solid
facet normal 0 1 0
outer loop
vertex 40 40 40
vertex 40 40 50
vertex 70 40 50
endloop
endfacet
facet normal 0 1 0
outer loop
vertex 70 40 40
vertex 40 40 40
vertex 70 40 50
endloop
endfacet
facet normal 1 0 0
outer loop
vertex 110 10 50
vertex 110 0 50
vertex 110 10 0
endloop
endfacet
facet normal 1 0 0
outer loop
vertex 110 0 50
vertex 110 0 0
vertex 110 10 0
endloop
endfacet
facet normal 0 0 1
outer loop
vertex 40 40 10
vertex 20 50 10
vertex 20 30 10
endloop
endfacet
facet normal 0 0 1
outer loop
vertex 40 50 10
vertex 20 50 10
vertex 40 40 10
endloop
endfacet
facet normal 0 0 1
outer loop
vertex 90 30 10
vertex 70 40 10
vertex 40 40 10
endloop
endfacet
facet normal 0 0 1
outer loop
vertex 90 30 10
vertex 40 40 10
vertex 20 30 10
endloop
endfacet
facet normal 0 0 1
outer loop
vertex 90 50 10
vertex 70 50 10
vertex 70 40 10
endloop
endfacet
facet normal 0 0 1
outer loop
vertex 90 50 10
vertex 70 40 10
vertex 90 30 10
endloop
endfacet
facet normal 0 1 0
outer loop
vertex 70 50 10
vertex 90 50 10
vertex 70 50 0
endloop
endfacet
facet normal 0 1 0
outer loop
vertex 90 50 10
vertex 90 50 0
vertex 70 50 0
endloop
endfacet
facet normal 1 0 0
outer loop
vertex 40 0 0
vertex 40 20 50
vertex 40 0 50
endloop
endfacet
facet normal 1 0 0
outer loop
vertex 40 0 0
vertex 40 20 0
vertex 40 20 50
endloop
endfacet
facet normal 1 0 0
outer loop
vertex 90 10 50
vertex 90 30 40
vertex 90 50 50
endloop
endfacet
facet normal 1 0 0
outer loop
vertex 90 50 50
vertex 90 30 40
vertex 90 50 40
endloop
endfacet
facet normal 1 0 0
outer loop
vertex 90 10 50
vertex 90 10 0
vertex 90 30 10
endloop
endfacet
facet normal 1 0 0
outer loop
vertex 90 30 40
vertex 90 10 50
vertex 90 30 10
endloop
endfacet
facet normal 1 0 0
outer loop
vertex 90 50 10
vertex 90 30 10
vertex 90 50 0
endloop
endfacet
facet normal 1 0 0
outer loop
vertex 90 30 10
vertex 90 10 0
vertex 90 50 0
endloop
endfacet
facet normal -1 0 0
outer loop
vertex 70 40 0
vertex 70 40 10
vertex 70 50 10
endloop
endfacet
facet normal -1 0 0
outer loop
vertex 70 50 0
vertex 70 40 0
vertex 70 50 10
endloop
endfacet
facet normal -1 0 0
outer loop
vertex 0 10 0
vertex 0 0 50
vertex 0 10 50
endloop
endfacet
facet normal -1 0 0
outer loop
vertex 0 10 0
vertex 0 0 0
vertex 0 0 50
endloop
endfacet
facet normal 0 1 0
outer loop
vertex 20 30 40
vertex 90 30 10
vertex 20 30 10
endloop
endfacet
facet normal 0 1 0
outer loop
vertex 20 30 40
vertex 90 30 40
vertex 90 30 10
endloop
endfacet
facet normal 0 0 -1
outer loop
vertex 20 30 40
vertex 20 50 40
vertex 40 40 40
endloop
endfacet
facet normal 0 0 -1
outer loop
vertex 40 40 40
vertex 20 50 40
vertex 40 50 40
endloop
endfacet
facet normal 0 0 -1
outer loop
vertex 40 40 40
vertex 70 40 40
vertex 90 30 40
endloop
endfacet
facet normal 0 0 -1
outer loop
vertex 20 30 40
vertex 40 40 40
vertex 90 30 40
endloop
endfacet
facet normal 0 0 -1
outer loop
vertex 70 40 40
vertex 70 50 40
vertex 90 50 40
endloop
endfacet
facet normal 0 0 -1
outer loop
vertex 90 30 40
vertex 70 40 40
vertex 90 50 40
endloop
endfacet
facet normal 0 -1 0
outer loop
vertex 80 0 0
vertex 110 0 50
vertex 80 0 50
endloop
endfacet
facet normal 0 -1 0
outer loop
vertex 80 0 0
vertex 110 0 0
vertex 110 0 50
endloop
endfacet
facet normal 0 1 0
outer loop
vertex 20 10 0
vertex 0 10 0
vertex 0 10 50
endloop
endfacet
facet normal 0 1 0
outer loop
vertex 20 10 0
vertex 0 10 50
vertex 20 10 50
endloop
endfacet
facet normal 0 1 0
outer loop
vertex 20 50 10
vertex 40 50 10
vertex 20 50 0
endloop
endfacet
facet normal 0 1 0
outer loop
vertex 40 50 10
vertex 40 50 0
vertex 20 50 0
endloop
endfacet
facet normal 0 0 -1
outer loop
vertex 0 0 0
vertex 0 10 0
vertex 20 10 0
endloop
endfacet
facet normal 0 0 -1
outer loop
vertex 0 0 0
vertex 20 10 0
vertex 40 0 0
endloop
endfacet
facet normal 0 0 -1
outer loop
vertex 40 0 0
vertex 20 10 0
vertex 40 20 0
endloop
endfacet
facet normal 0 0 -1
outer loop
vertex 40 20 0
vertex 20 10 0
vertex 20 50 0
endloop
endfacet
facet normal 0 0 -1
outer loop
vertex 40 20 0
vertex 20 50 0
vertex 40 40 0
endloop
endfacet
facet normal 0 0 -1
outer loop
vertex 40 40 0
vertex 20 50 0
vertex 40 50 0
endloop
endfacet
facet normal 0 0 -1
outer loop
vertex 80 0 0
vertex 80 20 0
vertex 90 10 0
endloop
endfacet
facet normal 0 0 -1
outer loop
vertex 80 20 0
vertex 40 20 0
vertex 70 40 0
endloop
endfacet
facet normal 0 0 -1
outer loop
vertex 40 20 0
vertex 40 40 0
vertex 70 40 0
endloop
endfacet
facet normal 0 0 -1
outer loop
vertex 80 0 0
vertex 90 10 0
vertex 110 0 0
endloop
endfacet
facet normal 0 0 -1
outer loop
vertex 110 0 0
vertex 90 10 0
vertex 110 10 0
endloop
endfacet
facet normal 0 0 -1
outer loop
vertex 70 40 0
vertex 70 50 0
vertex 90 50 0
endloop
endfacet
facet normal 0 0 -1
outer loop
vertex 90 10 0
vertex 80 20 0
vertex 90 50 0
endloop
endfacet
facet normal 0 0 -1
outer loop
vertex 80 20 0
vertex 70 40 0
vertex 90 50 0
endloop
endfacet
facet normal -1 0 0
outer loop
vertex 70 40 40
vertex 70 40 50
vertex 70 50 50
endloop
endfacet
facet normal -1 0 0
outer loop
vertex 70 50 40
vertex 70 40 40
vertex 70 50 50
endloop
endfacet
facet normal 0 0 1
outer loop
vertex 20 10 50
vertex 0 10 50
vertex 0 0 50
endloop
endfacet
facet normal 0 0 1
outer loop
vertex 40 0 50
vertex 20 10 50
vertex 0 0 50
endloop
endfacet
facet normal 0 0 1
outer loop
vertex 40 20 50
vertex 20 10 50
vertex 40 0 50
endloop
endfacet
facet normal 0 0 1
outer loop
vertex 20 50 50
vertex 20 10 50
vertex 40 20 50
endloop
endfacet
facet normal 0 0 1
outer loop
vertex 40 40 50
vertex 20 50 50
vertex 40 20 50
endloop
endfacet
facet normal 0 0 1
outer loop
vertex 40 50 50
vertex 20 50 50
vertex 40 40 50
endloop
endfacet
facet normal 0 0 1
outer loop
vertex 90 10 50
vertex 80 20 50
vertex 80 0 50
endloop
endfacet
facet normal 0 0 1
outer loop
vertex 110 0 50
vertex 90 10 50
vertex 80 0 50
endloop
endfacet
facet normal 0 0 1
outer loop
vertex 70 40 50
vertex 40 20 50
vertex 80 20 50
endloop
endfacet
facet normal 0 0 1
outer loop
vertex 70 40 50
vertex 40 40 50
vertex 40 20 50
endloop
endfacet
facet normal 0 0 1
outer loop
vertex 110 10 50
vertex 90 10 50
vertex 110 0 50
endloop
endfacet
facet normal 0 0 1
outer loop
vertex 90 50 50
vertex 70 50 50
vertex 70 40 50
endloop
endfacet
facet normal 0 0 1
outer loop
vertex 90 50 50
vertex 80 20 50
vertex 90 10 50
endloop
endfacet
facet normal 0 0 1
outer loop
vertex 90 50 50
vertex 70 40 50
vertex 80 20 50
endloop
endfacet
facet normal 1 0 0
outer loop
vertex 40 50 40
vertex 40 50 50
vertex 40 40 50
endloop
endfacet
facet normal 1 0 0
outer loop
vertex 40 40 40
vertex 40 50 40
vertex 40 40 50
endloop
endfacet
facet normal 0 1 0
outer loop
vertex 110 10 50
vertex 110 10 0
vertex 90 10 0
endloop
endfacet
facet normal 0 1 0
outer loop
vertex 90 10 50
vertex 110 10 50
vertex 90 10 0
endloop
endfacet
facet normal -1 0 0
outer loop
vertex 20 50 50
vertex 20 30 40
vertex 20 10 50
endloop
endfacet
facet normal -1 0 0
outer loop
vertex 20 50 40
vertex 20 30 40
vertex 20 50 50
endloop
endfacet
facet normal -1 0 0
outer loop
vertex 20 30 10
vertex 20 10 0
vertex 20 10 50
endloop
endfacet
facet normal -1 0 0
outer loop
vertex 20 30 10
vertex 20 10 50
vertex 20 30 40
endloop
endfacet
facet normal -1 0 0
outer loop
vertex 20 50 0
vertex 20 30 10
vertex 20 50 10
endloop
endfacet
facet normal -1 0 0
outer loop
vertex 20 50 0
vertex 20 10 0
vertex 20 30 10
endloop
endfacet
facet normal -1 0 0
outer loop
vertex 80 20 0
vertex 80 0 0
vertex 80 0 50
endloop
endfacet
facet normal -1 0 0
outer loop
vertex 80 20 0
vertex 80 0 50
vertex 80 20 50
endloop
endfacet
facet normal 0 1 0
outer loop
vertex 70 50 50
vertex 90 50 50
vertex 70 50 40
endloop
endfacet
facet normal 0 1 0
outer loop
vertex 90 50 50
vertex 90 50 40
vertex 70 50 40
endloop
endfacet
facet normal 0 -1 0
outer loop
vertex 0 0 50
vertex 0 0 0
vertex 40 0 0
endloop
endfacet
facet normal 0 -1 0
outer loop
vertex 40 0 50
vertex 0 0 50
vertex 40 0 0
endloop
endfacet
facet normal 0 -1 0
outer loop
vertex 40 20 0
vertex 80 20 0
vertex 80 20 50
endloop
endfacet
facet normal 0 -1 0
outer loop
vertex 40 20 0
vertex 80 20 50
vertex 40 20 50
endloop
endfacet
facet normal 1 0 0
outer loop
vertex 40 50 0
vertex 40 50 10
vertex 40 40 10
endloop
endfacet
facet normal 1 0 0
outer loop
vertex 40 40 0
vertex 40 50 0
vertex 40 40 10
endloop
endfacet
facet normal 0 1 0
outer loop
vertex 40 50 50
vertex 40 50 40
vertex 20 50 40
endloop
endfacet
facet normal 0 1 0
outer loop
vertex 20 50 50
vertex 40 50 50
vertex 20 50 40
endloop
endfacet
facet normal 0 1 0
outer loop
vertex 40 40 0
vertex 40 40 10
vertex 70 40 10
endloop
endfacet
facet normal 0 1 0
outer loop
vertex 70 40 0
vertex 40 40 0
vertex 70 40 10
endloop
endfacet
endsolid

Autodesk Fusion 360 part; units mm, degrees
sketch "Sketch1" plane through (0, 0, 0) normal (0, 0, 1) x (1, 0, 0)
  line L0 (110, 0) -> (80, 0)
  line L1 (80, 0) -> (80, 20)
  line L2 (80, 20) -> (40, 20)
  line L3 (40, 20) -> (40, 0)
  line L4 (0, 0) -> (40, 0)
  line L5 (80, 0) -> (110, 0)
  line L6 (110, 0) -> (110, 10)
  line L7 (110, 10) -> (90, 10)
  line L8 (90, 10) -> (90, 50)
  line L9 (90, 50) -> (20, 50)
  line L10 (0, 0) -> (0, 10)
  line L11 (0, 10) -> (20, 10)
  line L12 (20, 10) -> (20, 50)
  dimension "d1" = 110
  dimension "d2" = 30
  dimension "d3" = 20
  dimension "d4" = 40
  dimension "d5" = 10
  dimension "d6" = 20
  dimension "d7" = 70
  dimension "d8" = 10
  dimension "d9" = 20
extrude "Extrude1" add sketch "Sketch1" along normal blind 50
sketch "Sketch2" plane through (0, 0, 50) normal (0, 0, 1) x (1, 0, 0)
  line L0 (0, 0) -> (40, 0)
  line L1 (40, 0) -> (40, 20)
  line L2 (40, 20) -> (80, 20)
  line L3 (80, 20) -> (80, 0)
  line L4 (80, 0) -> (110, 0)
  line L5 (110, 0) -> (110, 10)
  line L6 (110, 10) -> (90, 10)
  line L7 (90, 10) -> (90, 50)
  line L8 (90, 50) -> (20, 50)
  line L9 (20, 50) -> (20, 10)
  line L10 (20, 10) -> (0, 10)
  line L11 (0, 10) -> (0, 0)
  line L12 (20, 50) -> (40, 50)
  line L13 (40, 50) -> (40, 40)
  line L14 (40, 40) -> (70, 40)
  line L15 (70, 40) -> (70, 50)
  line L16 (70, 50) -> (90, 50)
  dimension "d12" = 10
extrude "Extrude2" cut sketch "Sketch2" against normal blind 51 contours L8 L13 L14 L15
sketch "Sketch3" plane through (0, 50, 0) normal (0, 1, 0) x (-1, 0, 0)
  line L0 (-40, 50) -> (-40, 0)
  line L1 (-40, 0) -> (-20, 0)
  line L2 (-20, 0) -> (-20, 50)
  line L3 (-20, 50) -> (-40, 50)
  line L4 (-90, 0) -> (-90, 50)
  line L5 (-20, 40) -> (-90, 40)
  line L6 (-20, 10) -> (-90, 10)
  dimension "d15" = 10
  dimension "d16" = 10
extrude "Extrude3" cut sketch "Sketch3" against normal blind 20 contours L0 L2 L5 L6 | L0 L4 L5 L6
